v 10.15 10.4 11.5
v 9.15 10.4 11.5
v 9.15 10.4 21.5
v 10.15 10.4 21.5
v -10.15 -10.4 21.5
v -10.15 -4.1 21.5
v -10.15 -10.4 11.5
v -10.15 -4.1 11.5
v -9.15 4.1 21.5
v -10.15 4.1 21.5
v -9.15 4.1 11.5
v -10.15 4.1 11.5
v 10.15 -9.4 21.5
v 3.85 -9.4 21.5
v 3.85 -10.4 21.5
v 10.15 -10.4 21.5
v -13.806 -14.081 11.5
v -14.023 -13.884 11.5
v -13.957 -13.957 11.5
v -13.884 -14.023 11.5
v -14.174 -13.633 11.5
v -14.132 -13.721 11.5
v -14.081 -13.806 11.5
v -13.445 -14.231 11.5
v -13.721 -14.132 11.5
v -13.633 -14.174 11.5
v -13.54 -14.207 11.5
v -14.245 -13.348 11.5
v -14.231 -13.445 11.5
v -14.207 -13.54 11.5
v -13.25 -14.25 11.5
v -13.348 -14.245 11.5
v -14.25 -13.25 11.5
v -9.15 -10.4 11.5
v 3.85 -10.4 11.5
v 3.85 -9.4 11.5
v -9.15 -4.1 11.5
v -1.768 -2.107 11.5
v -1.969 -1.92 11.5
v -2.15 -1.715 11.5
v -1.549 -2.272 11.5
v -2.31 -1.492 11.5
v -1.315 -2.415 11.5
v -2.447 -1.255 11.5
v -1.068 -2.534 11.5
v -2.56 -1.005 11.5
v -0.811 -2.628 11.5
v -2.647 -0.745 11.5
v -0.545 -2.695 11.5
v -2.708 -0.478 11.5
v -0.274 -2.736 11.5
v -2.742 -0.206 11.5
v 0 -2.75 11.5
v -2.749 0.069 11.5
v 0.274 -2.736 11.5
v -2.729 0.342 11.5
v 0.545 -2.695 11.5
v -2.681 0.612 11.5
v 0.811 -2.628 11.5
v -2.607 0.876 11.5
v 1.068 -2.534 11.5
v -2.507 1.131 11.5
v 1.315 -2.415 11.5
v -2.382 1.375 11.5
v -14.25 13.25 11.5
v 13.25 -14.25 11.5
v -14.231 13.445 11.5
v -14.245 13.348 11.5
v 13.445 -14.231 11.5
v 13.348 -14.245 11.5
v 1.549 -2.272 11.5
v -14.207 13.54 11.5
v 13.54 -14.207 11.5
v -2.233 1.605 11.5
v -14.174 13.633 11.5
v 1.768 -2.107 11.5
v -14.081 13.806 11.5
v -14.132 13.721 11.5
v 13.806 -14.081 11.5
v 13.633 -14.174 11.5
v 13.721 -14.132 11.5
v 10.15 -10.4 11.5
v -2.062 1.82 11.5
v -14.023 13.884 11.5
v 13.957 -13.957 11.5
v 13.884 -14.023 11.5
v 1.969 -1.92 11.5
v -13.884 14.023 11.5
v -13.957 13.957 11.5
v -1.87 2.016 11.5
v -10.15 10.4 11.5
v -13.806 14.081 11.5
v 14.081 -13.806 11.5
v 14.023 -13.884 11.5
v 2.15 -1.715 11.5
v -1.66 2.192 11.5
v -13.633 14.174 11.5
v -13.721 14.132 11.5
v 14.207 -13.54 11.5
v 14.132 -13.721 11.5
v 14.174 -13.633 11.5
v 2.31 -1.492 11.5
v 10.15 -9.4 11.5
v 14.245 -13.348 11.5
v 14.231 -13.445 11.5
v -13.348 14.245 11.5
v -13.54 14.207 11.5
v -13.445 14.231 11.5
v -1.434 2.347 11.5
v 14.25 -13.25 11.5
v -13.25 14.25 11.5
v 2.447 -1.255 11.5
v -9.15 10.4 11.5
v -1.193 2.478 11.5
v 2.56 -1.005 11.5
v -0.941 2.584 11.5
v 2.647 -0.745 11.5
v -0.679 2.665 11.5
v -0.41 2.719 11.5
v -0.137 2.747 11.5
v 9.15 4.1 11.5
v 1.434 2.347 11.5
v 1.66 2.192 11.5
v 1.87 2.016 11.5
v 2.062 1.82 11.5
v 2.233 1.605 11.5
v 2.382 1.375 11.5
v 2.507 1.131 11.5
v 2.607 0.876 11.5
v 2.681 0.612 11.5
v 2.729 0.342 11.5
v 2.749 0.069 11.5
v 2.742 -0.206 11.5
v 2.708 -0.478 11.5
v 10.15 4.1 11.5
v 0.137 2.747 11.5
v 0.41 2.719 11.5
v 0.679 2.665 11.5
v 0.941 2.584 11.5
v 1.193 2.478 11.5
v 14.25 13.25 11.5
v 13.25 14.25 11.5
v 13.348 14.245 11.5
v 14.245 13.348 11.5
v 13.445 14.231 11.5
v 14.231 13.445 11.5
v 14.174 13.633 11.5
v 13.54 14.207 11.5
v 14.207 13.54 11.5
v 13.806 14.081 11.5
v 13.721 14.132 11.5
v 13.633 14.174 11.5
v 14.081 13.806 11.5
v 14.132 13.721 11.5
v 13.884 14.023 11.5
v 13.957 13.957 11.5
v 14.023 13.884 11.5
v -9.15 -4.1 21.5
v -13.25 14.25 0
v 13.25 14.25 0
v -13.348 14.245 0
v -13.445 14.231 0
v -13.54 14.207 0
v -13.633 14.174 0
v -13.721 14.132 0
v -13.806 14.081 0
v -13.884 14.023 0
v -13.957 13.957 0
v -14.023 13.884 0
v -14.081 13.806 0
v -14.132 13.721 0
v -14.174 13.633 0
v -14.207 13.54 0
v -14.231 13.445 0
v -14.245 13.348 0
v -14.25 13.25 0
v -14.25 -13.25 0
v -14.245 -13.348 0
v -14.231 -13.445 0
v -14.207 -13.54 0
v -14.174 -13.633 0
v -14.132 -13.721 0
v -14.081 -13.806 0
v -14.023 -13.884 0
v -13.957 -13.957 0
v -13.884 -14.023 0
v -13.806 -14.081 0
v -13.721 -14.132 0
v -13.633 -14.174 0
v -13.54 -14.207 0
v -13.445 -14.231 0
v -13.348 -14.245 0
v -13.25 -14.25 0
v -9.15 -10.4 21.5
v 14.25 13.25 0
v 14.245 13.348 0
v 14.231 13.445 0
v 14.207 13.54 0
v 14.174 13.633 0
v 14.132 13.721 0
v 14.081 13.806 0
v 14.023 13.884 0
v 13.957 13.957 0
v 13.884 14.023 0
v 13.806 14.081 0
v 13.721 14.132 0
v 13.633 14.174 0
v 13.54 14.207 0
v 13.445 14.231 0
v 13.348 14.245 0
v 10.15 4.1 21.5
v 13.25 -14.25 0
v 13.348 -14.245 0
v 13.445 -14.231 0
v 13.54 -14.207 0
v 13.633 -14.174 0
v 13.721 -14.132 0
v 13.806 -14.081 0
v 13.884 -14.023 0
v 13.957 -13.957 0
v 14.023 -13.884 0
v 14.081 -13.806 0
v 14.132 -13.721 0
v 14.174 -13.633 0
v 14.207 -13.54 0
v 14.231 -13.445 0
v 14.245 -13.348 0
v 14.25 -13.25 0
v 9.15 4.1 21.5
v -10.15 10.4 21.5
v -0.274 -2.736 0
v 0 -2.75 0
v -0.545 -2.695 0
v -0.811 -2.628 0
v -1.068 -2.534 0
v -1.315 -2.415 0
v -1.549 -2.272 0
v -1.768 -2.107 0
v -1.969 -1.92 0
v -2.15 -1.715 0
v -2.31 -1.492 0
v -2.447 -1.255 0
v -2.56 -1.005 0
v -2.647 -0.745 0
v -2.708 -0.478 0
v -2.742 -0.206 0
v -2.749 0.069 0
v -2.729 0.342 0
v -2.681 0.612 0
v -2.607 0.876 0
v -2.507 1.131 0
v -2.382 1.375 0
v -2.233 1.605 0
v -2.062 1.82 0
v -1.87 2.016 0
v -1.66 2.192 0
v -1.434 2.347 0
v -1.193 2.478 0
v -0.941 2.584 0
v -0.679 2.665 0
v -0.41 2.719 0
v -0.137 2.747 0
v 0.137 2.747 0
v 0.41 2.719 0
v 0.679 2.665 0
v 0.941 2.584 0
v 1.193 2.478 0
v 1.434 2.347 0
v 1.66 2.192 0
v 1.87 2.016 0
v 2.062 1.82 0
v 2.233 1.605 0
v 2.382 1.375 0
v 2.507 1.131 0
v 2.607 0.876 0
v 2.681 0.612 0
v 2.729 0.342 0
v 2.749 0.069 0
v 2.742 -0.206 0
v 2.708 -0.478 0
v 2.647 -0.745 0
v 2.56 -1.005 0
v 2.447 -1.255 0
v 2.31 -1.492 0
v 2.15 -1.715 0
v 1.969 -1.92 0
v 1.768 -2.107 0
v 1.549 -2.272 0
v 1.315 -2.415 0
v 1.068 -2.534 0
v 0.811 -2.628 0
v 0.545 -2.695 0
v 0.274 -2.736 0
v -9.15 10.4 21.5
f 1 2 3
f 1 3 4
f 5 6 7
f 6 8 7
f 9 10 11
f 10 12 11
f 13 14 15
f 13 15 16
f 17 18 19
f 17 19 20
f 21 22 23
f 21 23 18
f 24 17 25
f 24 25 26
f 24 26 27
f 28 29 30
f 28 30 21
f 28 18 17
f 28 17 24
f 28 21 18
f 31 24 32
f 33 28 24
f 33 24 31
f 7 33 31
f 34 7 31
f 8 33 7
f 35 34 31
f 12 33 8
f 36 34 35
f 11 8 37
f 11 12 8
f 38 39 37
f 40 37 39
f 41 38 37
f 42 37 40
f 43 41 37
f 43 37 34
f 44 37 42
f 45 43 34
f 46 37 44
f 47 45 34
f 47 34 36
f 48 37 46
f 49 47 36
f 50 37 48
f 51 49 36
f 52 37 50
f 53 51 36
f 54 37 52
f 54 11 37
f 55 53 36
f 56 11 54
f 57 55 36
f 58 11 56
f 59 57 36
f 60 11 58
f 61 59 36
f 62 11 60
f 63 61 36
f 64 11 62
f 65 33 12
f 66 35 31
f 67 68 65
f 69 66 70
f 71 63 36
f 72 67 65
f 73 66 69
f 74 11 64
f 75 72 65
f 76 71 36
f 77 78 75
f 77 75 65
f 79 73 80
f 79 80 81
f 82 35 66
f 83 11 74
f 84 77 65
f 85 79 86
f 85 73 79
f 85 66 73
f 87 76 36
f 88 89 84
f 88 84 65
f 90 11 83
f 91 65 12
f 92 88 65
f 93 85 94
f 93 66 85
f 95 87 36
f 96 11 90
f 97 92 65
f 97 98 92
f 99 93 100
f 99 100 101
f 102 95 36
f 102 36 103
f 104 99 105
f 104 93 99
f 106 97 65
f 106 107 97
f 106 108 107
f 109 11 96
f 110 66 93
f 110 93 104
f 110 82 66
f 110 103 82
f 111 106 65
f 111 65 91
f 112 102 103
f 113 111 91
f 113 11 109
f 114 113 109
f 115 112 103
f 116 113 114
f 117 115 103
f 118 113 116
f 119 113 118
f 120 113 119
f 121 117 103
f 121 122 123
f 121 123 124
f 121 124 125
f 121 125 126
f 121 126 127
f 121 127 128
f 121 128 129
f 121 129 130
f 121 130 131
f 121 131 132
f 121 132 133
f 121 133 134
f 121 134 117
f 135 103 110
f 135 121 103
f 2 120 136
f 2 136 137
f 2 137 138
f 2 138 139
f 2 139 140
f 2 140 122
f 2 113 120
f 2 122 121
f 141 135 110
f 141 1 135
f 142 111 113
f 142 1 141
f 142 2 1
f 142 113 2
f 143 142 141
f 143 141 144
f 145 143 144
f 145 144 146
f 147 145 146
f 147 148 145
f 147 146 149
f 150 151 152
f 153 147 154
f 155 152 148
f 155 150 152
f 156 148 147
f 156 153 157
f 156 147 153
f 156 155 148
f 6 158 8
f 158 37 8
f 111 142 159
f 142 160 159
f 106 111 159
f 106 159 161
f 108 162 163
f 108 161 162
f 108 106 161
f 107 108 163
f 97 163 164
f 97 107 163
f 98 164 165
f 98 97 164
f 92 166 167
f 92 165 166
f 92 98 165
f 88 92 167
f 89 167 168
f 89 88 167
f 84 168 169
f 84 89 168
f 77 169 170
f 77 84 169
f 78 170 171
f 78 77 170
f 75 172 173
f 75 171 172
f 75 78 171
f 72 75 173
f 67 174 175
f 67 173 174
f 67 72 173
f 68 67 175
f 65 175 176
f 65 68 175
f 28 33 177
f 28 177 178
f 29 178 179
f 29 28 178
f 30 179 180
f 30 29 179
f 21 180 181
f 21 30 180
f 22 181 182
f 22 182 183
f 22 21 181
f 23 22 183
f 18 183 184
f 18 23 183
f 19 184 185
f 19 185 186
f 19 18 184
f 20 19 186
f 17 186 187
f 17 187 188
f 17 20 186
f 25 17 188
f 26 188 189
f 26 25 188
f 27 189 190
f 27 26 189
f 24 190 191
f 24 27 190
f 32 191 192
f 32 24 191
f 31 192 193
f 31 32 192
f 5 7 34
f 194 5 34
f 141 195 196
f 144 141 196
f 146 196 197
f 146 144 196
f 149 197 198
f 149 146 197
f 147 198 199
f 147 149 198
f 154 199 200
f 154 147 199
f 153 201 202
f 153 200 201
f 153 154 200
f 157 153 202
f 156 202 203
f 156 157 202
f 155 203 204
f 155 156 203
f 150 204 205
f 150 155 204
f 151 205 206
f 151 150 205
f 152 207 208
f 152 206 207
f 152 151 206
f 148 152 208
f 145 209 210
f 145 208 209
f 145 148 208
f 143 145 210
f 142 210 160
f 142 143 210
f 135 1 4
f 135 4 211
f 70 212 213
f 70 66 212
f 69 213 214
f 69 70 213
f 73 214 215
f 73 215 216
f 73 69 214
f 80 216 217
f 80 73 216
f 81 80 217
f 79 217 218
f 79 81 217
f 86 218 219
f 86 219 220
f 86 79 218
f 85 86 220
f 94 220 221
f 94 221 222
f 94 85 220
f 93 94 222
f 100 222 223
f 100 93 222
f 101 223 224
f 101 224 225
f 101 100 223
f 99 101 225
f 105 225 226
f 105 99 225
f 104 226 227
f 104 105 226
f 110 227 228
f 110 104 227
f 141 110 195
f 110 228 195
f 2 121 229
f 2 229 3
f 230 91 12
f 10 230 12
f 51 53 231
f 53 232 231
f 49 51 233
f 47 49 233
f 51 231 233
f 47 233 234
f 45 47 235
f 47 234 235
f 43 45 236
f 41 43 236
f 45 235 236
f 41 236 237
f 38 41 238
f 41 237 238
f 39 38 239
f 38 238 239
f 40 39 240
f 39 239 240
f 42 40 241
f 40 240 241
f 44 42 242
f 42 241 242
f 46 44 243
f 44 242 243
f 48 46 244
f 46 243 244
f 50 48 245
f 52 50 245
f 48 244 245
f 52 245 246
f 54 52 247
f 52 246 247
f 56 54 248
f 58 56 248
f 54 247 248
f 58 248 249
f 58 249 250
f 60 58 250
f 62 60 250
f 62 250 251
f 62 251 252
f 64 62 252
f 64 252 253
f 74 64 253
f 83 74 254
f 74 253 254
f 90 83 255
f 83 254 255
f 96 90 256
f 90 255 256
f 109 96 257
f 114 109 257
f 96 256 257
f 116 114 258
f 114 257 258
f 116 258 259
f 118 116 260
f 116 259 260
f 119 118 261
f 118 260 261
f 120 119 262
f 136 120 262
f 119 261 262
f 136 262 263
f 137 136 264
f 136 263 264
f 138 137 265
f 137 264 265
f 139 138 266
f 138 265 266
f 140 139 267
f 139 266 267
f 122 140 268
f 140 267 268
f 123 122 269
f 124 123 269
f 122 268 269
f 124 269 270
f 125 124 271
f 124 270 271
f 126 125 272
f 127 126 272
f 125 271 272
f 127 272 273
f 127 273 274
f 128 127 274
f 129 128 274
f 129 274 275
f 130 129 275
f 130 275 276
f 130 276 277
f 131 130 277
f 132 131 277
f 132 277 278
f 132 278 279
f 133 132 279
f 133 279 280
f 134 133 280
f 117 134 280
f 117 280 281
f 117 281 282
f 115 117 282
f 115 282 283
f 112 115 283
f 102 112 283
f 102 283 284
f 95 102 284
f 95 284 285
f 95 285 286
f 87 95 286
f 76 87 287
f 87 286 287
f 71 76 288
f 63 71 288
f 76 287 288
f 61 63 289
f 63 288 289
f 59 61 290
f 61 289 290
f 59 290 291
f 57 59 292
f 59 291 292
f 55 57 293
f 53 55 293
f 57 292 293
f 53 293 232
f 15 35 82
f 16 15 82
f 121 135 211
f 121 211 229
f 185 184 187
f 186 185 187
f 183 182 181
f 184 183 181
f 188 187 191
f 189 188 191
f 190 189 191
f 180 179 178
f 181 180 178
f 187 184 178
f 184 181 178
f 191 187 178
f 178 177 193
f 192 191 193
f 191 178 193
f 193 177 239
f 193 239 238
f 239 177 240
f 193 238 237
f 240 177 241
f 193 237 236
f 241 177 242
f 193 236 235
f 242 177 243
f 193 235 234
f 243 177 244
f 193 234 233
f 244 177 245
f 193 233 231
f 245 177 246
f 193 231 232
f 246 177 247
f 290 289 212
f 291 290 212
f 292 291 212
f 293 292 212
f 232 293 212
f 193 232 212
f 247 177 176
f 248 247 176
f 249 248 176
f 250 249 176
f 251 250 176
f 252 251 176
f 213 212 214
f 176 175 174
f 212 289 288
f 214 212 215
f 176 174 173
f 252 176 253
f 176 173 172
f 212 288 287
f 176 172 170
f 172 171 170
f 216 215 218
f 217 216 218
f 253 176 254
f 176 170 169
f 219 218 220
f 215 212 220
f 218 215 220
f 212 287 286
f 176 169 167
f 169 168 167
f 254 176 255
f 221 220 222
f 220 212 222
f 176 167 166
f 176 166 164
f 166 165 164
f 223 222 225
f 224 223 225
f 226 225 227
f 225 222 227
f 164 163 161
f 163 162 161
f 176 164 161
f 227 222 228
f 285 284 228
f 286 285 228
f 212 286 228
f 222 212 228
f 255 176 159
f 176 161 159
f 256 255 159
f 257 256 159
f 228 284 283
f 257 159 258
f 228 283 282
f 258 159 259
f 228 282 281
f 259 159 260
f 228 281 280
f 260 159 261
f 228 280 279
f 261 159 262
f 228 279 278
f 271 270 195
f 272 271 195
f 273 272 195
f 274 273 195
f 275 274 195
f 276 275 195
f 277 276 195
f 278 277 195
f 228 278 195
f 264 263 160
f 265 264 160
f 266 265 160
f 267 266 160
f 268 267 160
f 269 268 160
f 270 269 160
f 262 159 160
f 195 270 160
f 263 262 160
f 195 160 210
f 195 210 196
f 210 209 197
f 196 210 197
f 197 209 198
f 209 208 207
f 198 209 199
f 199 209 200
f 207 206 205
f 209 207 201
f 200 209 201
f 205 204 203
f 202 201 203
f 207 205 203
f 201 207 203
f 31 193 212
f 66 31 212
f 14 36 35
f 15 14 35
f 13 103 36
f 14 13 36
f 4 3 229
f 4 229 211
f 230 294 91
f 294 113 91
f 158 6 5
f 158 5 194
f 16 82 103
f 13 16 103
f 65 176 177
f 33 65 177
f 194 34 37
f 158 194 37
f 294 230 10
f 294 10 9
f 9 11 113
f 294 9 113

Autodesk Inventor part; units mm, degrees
ref_plane "YZ Plane" through (0, 0, 0) normal (1, 0, 0) x (0, 1, 0)
ref_plane "XZ Plane" through (0, 0, 0) normal (0, 1, 0) x (-1, 0, 0)
ref_plane "XY Plane" through (0, 0, 0) normal (0, 0, 1) x (1, 0, 0)
sketch "Sketch1" plane through (0, 0, 0) normal (0, 0, 1) x (1, 0, 0)
  line L0 (-14.25, -14.25) -> (14.25, -14.25)
  line L1 (14.25, -14.25) -> (14.25, 14.25)
  line L2 (14.25, 14.25) -> (-14.25, 14.25)
  line L3 (-14.25, 14.25) -> (-14.25, -14.25)
  line L4 (-14.25, -14.25) -> (14.25, 14.25) construction
  line L5 (14.25, -14.25) -> (-14.25, 14.25) construction
  point P0 (0, 0)
  dimension "d0" = 28.5
  dimension "d1" = 28.5
extrude "Extrusion1" add sketch "Sketch1" along normal blind 11.5
sketch "Sketch2" plane through (0, 0, 11.5) normal (0, 0, 1) x (1, 0, 0)
  line L0 (-10.15, 4.1) -> (-9.15, 4.1)
  line L1 (-9.15, 4.1) -> (-9.15, 10.4)
  line L2 (-9.15, 10.4) -> (-10.15, 10.4)
  line L3 (-10.15, 10.4) -> (-10.15, 4.1)
  line L4 (-10.15, -10.4) -> (-9.15, -10.4)
  line L5 (-9.15, -10.4) -> (-9.15, -4.1)
  line L6 (-9.15, -4.1) -> (-10.15, -4.1)
  line L7 (-10.15, -4.1) -> (-10.15, -10.4)
  line L8 (3.85, -10.4) -> (10.15, -10.4)
  line L9 (10.15, -10.4) -> (10.15, -9.4)
  line L10 (10.15, -9.4) -> (3.85, -9.4)
  line L11 (3.85, -9.4) -> (3.85, -10.4)
  line L12 (9.15, 10.4) -> (10.15, 10.4)
  line L13 (10.15, 10.4) -> (10.15, 4.1)
  line L14 (10.15, 4.1) -> (9.15, 4.1)
  line L15 (9.15, 4.1) -> (9.15, 10.4)
  line L16 (-9.15, 4.1) -> (-9.15, -4.1) construction
  line L17 (-9.15, 10.4) -> (9.15, 10.4) construction
  point P0 (0, 0)
  point P1 (-9.15, 0)
  point P2 (0, 10.4)
  dimension "d4" = 1
  dimension "d5" = 1
  dimension "d6" = 1
  dimension "d7" = 6.3
  dimension "d8" = 6.3
  dimension "d9" = 6.3
  dimension "d10" = 8.2
  dimension "d11" = 13
extrude "Extrusion2" add sketch "Sketch2" along normal blind 10
sketch "Sketch3" plane through (0, 0, 11.5) normal (0, 0, 1) x (1, 0, 0)
  point P0 (0, 0)
  point P1 (0, 0)
hole "Hole1" at (0, 0, 11.5) direction (0, 0, -1) diameter 5.5 end through all clearance for "Countersunk Flat Head Screw DIN EN ISO 2009" size "M5" standard "DIN"
fillet "Fillet1" radius 1 4 edges at (14.25, 14.25, 5.75) (-14.25, 14.25, 5.75) (-14.25, -14.25, 5.75) (14.25, -14.25, 5.75)
properties part number "Gleichrichter"
